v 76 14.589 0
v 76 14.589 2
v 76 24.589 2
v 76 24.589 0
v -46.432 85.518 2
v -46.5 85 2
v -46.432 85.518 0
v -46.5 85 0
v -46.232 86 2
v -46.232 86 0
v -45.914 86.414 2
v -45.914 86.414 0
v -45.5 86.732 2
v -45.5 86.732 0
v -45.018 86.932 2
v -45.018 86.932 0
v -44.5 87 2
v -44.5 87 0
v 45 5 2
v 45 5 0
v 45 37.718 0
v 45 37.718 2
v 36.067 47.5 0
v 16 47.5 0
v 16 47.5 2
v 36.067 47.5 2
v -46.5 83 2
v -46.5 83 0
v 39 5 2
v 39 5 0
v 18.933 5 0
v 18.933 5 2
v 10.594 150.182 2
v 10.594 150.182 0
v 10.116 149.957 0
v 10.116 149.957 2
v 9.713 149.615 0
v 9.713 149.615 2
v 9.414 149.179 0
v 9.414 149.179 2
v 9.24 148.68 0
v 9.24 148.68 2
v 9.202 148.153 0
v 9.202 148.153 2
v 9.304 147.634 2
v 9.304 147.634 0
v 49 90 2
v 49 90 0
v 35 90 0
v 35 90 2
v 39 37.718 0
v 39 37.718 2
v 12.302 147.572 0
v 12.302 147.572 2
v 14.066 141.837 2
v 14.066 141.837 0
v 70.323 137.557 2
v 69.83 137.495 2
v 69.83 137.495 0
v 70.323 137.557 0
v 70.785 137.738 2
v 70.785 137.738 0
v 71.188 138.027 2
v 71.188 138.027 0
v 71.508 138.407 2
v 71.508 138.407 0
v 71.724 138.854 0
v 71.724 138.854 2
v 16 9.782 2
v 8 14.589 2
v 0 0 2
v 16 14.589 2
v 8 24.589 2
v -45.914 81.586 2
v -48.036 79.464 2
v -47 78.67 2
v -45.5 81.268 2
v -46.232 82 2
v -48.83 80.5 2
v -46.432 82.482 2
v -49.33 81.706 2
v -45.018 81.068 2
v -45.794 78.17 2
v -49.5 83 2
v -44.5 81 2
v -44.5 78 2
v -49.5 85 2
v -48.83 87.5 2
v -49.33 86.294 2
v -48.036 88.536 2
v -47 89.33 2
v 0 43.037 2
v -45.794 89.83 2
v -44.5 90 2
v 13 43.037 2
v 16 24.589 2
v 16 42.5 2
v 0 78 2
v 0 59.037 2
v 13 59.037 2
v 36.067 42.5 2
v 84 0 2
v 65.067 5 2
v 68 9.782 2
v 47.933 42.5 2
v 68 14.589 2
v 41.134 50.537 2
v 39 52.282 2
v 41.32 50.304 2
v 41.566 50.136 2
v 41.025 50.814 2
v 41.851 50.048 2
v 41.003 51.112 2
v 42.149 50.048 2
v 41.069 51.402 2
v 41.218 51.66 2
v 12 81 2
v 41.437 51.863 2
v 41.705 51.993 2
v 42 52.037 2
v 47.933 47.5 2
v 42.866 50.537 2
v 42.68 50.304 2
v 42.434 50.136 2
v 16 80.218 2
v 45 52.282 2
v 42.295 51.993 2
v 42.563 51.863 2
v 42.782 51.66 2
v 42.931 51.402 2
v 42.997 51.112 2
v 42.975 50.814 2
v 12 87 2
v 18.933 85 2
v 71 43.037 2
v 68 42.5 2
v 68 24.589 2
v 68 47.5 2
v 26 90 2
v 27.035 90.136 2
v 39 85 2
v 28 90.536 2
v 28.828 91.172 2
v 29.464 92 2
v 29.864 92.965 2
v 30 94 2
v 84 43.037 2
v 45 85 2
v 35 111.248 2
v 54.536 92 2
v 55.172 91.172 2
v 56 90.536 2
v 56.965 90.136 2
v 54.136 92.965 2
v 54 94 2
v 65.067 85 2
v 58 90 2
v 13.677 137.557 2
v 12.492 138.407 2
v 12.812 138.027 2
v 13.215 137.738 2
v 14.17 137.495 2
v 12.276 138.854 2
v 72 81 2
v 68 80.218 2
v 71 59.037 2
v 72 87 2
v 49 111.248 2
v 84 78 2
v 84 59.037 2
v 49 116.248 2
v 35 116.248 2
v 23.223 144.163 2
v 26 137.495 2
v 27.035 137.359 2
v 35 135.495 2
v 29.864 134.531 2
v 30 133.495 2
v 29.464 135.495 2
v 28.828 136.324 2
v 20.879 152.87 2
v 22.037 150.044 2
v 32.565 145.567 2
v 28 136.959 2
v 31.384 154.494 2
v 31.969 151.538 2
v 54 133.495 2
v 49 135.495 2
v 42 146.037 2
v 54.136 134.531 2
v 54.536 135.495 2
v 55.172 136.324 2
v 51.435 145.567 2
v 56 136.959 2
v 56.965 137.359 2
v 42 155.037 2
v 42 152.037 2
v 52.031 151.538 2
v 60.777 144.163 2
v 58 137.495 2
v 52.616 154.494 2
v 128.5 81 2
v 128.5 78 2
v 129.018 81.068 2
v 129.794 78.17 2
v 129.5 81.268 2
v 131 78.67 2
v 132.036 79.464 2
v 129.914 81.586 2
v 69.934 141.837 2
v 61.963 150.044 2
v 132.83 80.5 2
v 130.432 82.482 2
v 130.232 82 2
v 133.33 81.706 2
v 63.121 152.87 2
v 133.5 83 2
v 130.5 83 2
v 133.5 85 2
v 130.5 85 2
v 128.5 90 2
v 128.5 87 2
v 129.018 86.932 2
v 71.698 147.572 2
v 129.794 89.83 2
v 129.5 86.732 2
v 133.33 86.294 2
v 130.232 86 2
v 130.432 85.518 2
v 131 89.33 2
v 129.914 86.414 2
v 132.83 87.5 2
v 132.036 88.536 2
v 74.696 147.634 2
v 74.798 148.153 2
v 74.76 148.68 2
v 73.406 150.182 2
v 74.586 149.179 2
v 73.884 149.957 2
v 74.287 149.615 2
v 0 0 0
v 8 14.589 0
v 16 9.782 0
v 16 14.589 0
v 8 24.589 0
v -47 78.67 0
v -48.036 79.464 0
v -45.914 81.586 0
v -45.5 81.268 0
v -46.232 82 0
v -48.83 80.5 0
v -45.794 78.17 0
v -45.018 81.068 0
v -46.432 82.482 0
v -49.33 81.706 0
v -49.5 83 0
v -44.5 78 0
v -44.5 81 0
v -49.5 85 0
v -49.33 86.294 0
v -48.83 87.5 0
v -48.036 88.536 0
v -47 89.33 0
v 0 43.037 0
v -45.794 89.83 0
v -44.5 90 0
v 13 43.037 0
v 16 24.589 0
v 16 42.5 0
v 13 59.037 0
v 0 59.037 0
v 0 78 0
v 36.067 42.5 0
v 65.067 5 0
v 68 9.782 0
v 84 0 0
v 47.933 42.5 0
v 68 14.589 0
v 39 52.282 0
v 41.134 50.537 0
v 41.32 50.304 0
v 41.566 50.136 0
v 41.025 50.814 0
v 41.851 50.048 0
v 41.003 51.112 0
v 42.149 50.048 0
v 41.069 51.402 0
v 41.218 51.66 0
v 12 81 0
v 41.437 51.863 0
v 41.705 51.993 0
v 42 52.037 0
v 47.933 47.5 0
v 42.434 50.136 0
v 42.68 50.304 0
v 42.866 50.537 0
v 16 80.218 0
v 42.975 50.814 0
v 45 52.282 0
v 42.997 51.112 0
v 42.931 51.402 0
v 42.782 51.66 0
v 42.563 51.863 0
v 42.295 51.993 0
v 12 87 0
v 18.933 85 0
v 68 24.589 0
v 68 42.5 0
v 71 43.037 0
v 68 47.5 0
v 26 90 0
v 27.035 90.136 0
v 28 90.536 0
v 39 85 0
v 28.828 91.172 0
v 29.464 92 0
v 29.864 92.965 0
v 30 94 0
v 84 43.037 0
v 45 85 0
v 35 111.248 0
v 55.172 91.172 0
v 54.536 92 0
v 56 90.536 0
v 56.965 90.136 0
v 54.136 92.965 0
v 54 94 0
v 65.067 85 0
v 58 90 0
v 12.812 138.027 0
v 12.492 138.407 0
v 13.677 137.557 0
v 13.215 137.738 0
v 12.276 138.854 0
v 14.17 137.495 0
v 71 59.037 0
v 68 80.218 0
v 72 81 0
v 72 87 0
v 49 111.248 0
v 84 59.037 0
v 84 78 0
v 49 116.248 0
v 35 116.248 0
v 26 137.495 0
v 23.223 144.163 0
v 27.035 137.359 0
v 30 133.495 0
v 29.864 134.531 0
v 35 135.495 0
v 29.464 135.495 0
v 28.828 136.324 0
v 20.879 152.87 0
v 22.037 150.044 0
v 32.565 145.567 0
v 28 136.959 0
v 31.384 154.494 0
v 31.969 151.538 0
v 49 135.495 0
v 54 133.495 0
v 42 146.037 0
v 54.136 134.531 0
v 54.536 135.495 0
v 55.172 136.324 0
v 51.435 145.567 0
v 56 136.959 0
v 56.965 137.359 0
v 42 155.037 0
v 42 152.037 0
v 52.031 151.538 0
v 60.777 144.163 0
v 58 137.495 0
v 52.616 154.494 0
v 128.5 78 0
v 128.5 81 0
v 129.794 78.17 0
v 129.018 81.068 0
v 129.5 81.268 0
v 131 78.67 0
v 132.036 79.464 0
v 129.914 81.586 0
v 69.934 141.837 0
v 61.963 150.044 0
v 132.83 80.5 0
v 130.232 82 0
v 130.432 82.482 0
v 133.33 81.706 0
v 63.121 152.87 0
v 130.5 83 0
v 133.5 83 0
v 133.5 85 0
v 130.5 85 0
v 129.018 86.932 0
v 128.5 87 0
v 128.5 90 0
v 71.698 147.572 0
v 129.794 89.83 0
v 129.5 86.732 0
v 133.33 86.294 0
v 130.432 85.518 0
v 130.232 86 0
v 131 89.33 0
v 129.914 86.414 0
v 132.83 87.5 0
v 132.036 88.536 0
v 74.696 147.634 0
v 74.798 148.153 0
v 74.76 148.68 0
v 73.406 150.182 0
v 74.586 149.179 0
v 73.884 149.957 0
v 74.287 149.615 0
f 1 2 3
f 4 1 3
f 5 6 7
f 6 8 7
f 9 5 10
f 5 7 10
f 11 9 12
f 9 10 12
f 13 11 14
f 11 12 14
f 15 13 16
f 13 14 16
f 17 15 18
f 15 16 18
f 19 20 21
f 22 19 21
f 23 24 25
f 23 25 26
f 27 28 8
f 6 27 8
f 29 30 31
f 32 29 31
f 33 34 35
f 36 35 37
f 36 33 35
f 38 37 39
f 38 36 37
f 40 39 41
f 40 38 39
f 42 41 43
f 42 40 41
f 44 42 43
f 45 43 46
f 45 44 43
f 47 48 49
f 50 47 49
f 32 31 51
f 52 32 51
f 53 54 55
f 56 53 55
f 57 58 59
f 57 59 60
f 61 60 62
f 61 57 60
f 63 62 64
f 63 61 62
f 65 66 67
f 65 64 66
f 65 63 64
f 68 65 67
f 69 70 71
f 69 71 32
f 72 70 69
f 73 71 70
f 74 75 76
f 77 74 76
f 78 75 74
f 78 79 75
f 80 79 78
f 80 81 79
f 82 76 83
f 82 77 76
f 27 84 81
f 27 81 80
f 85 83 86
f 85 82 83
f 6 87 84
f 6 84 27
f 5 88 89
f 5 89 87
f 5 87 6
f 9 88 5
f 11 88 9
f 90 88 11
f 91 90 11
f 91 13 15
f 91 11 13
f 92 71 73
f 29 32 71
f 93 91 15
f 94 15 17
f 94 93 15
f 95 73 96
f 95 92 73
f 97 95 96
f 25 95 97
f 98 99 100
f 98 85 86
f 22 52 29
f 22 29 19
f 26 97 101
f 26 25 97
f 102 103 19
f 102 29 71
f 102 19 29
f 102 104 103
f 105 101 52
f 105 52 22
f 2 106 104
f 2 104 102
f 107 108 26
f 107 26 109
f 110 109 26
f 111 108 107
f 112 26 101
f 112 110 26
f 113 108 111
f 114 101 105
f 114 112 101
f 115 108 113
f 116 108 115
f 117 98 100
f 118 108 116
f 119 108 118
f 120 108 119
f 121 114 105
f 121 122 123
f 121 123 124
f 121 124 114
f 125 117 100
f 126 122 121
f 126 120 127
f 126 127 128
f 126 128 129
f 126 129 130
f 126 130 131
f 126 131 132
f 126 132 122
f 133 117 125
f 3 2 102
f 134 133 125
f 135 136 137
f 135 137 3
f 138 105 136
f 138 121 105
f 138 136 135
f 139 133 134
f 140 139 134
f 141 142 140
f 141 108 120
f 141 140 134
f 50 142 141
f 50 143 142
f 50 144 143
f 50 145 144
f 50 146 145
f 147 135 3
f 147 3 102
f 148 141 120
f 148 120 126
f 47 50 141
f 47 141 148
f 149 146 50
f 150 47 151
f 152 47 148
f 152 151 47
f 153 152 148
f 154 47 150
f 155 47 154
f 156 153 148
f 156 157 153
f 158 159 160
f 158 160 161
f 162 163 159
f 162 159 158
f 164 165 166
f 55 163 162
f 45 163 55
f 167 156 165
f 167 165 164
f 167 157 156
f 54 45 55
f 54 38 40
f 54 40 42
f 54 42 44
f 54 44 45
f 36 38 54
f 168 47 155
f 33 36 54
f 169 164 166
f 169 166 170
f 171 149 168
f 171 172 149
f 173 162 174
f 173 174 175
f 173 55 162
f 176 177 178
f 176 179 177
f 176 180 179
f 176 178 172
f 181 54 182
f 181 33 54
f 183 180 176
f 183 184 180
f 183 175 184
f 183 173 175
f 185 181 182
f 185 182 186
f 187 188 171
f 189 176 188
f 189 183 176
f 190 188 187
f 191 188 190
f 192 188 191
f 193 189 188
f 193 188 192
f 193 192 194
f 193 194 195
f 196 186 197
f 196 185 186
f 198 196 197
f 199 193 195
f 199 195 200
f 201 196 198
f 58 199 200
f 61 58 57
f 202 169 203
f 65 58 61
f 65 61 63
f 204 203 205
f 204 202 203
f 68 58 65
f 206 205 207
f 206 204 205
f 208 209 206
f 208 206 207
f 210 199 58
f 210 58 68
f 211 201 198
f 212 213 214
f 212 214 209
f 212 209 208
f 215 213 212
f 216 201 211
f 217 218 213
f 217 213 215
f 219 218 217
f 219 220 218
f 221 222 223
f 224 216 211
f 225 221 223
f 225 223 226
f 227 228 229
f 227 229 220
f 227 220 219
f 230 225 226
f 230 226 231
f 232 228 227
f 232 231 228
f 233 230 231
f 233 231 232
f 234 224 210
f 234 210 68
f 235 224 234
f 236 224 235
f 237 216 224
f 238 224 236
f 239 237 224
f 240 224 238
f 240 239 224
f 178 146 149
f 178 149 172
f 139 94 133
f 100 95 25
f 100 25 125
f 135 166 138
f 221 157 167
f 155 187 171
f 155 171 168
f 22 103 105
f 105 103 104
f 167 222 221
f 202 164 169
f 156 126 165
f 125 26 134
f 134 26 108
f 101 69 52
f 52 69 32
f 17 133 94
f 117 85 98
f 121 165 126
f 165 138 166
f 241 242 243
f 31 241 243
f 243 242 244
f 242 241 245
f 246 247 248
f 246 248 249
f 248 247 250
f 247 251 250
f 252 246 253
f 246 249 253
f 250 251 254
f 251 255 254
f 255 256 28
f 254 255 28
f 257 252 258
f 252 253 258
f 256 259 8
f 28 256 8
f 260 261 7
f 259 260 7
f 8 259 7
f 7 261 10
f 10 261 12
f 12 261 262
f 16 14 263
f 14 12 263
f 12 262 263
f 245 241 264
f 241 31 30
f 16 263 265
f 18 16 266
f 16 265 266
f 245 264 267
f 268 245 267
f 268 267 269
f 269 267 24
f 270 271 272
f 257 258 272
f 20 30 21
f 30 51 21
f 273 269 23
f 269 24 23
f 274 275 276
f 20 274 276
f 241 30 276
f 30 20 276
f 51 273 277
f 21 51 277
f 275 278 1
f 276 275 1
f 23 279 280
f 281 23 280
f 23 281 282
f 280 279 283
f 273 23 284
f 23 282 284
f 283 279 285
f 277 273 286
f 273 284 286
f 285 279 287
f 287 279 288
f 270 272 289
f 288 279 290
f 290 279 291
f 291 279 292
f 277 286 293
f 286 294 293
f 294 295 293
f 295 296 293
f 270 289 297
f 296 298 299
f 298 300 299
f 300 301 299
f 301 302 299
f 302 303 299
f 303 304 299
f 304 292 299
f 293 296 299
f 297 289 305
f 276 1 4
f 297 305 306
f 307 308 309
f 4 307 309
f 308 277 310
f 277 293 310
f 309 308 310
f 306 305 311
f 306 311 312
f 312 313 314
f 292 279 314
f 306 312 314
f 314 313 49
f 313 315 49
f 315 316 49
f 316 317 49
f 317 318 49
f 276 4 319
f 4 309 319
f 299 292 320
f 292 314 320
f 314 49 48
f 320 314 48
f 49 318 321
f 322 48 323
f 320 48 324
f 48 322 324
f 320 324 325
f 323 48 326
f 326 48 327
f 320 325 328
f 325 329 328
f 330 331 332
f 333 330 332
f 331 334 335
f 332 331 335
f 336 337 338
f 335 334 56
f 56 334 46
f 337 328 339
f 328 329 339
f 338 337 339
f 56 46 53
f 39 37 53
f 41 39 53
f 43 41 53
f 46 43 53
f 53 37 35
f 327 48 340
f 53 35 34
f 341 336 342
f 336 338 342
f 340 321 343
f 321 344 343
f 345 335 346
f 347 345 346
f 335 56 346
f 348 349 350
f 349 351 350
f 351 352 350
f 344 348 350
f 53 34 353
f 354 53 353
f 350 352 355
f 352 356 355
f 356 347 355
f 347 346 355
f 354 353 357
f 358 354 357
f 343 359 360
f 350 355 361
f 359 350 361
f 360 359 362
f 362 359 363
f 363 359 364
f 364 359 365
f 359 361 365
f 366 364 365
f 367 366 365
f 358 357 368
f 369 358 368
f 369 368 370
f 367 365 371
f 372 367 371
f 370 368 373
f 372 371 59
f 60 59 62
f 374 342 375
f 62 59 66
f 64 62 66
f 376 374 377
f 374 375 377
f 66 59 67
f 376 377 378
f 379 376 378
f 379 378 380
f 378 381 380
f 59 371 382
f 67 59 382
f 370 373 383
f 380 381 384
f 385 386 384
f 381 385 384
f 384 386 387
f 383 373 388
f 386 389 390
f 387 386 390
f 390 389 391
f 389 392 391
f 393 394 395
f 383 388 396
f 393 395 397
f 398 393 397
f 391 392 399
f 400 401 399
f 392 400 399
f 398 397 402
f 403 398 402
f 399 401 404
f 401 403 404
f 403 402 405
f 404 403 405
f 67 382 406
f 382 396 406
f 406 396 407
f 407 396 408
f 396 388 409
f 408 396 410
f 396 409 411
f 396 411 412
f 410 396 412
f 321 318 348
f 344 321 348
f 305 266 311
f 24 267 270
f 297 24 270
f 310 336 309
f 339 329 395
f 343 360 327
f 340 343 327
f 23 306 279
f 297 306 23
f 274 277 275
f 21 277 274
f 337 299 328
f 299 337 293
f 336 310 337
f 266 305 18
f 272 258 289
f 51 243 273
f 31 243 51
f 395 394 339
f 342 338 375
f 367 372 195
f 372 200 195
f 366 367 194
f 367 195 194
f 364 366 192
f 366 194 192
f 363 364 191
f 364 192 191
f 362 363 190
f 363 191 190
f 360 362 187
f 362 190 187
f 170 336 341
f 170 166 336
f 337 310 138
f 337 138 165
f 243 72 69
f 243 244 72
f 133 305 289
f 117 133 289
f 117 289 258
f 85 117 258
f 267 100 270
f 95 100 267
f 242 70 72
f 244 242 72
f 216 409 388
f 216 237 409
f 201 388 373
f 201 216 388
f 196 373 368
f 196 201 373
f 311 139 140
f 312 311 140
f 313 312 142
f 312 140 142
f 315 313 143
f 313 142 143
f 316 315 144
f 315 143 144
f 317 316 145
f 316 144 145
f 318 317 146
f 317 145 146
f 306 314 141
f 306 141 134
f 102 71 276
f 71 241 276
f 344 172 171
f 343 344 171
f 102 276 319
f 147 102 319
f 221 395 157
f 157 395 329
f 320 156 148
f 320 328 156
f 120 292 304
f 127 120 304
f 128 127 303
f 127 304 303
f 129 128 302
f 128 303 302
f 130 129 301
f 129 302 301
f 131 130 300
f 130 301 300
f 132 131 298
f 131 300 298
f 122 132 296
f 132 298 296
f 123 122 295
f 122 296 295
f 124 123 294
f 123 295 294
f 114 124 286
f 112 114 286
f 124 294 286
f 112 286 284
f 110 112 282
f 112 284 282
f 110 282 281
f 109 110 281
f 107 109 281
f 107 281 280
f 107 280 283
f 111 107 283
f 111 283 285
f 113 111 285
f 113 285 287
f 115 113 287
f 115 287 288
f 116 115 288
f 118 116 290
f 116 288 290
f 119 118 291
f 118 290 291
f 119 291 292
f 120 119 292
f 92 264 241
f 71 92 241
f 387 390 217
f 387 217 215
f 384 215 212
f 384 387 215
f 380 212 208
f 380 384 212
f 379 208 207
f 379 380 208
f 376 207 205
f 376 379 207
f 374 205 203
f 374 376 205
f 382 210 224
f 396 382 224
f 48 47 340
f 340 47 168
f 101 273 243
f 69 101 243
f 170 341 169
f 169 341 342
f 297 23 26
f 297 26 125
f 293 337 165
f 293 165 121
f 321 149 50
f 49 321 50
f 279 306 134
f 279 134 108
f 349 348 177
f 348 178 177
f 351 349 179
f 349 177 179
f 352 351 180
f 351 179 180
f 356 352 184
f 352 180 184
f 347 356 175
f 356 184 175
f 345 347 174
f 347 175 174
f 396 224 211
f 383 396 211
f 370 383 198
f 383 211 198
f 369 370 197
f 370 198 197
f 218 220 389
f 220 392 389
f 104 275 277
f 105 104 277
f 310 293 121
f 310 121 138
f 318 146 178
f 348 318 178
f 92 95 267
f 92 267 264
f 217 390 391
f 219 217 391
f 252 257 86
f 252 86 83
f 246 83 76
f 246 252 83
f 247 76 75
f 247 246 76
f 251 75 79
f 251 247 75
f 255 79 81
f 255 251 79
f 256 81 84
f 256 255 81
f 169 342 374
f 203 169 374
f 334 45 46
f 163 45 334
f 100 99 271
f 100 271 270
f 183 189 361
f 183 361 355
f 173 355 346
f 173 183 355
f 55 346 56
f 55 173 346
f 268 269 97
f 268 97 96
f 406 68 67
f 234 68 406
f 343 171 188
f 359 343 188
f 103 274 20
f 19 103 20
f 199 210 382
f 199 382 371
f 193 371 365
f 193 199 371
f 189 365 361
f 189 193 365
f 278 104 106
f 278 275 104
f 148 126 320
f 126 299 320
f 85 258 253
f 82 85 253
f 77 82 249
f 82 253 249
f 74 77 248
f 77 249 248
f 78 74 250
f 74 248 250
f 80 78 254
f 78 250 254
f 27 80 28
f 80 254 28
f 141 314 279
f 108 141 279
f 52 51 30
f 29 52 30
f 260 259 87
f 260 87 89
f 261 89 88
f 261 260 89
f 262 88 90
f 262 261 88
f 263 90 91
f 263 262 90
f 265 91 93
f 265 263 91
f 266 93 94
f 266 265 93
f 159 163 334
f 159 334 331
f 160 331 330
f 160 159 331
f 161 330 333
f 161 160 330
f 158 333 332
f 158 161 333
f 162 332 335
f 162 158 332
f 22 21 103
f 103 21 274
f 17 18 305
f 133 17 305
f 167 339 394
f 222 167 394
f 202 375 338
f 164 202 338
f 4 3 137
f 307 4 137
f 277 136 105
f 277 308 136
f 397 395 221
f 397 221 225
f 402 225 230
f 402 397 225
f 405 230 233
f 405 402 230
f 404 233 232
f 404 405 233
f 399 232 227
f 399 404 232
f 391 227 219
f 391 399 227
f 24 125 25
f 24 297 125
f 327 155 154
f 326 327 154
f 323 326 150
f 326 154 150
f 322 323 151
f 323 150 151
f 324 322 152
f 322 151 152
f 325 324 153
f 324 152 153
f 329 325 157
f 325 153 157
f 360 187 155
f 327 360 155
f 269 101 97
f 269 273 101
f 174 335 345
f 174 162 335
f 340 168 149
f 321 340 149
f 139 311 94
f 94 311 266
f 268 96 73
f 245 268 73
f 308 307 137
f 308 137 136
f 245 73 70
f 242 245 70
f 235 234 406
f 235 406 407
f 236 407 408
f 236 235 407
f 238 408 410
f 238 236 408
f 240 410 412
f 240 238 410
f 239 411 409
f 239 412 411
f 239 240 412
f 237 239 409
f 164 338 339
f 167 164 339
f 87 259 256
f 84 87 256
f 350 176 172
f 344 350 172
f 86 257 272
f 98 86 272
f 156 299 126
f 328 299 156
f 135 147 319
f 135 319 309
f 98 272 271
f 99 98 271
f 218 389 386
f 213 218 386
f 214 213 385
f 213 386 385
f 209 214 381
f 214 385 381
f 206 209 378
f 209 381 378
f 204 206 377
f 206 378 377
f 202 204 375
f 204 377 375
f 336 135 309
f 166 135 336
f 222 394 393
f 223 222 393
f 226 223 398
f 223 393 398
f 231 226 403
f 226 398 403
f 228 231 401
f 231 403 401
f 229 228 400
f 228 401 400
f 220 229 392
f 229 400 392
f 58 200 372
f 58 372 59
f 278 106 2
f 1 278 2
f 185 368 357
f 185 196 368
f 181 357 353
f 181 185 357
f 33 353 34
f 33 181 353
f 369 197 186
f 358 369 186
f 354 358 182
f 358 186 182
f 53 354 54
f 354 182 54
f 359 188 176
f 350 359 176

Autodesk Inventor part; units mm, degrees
ref_plane "YZ Plane" through (0, 0, 0) normal (1, 0, 0) x (0, 1, 0)
ref_plane "XZ Plane" through (0, 0, 0) normal (0, 1, 0) x (-1, 0, 0)
ref_plane "XY Plane" through (0, 0, 0) normal (0, 0, 1) x (1, 0, 0)
sketch "Sketch1" plane through (0, 0, 0) normal (0, 0, 1) x (1, 0, 0)
  line L0 (0, 0) -> (42, 0)
  line L1 (42, 0) -> (42, 90)
  line L2 (42, 90) -> (0, 90)
  line L3 (0, 90) -> (0, 0)
  line L4 (0, 90) -> (16, 90)
  line L5 (16, 90) -> (16, 0)
  line L6 (16, 0) -> (0, 0)
  line L7 (0, 0) -> (0, 90)
  line L8 (16, 90) -> (42, 90)
  line L9 (42, 90) -> (42, 85)
  line L10 (42, 85) -> (16, 85)
  line L11 (16, 85) -> (16, 90)
  line L12 (16, 0) -> (42, 0)
  line L13 (42, 0) -> (42, 5)
  line L14 (42, 5) -> (16, 5)
  line L15 (16, 5) -> (16, 0)
  line L16 (16, 47.5) -> (42, 47.5)
  line L17 (42, 47.5) -> (42, 42.5)
  line L18 (42, 42.5) -> (16, 42.5)
  line L19 (16, 42.5) -> (16, 47.5)
  line L20 (0, 90) -> (-44.5, 90)
  line L21 (-49.5, 85) -> (-49.5, 83)
  line L22 (-44.5, 78) -> (0, 78)
  line L23 (0, 78) -> (0, 90)
  arc A0 (-44.5, 90) -> (-49.5, 85) centre (-44.5, 85) ccw
  arc A1 (-49.5, 83) -> (-44.5, 78) centre (-44.5, 83) ccw
  line L24 (-44.5, 87) -> (-3, 87)
  line L25 (-3, 87) -> (-3, 81)
  line L26 (-3, 81) -> (-44.5, 81)
  arc A2 (-46.5, 83) -> (-44.5, 81) centre (-44.5, 83) ccw
  line L27 (-46.5, 83) -> (-46.5, 85)
  arc A3 (-44.5, 87) -> (-46.5, 85) centre (-44.5, 85) ccw
  line L28 (-3, 87) -> (12, 87)
  line L29 (12, 87) -> (12, 81)
  line L30 (12, 81) -> (-3, 81)
  line L31 (-3, 81) -> (-3, 87)
  line L32 (42, 85) -> (39, 85)
  line L33 (39, 85) -> (39, 5)
  line L34 (39, 5) -> (42, 5)
  line L35 (42, 5) -> (42, 85)
  circle A4 centre (42, 51.037) radius 1
  line L36 (16, 85) -> (39, 47.5) construction
  line L37 (39, 42.5) -> (16, 5) construction
  line L38 (18.9328, 85) -> (39, 52.2817)
  line L39 (36.0672, 47.5) -> (16, 80.2183)
  line L40 (36.0672, 42.5) -> (16, 9.7817)
  line L41 (18.9328, 5) -> (39, 37.7183)
  point P0 (16, 45)
  point P1 (16, 45)
  point P2 (-49.5, 78)
  point P3 (-49.5, 90)
  point P4 (27.5, 23.75)
  point P5 (16, 42.5)
  point P6 (0, 78)
  point P7 (42, 50.037)
  point P8 (42, 52.037)
  dimension "d0" = 42
  dimension "d1" = 90
  dimension "d2" = 16
  dimension "d3" = 5
  dimension "d4" = 26
  dimension "d5" = 5
  dimension "d6" = 26
  dimension "d7" = 5
  dimension "d8" = 49.5
  dimension "d9" = 12
  dimension "d10" = 5
  dimension "d11" = 3
  dimension "d12" = 15
  dimension "d13" = 6
  dimension "d14" = 3
  dimension "d17" = 2
  dimension "d19" = 38.963
  dimension "d20" = 2.5
  dimension "d21" = 2.5
  dimension "d22" = 2.5
  dimension "d23" = 2.5
extrude "Extrusion1" add sketch "Sketch1" along normal blind 2 contours L3 L30 L29 L28 L2 L5 L0 | L5 L14 L1 L0 | L22 A1 L21 A0 L20 L3 L28 L24 A3 L27 A2 L26 L30 | L5 L40 L18 L33 L41 L14 | L14 L33 L18 L1 | L18 L33 L16 L1 | L5 L16 L33 L18 | L16 L33 L10 L1 A4 | L2 L1 L10 L5 | L16 L39 L5 L10 L38 L33
sketch "Sketch2" plane through (0, 0, 2) normal (0, 0, 1) x (1, 0, 0)
  arc A0 (42, 52.037) -> (42, 50.037) centre (42, 51.037) ccw projected
  circle A1 centre (42, 51.037) radius 104 construction
  circle A2 centre (42, 51.037) radius 101 construction
  circle A3 centre (42, 51.037) radius 95 construction
  circle A4 centre (42, 51.037) radius 93 construction
  line L0 (42, 90) -> (-44.5, 90) projected
  line L1 (42, 90) -> (42, -52.963)
  line L2 (42, 155.037) -> (42, 90)
  line L3 (42, 51.037) -> (8.6562, 149.5469) construction
  line L4 (42, 51.037) -> (146, 51.037) construction
  line L5 (42, 51.037) -> (13.2923, 139.4953) construction
  line L6 (42, 51.037) -> (135, 51.037) construction
  line L7 (42, 51.037) -> (12.3019, 147.5721) construction
  line L8 (42, 51.037) -> (143, 51.037) construction
  line L9 (12.3019, 147.5721) -> (14.0662, 141.8373)
  arc A5 (42, 152.037) -> (12.3019, 147.5721) centre (42, 51.037) ccw
  arc A6 (42, 146.037) -> (14.0662, 141.8373) centre (42, 51.037) ccw
  line L10 (14.0662, 141.8373) -> (16.0662, 141.8373) construction
  line L11 (13.2923, 139.4953) -> (13.2923, 137.4953) construction
  line L12 (9.3038, 147.6339) -> (12.2756, 138.8541)
  arc A7 (42, 155.037) -> (10.5942, 150.1817) centre (42, 51.037) ccw
  line L13 (42, 90) -> (30, 90)
  line L14 (30, 94) -> (30, 133.4953)
  line L15 (30, 137.4953) -> (42, 137.4953)
  line L16 (42, 137.4953) -> (42, 90)
  line L17 (14.17, 137.4953) -> (26, 137.4953)
  line L18 (30, 137.4953) -> (35, 137.4953)
  line L19 (35, 137.4953) -> (35, 90)
  line L20 (35, 90) -> (30, 90)
  line L21 (30, 90) -> (30, 137.4953)
  line L22 (35, 137.4953) -> (42, 137.4953)
  line L23 (42, 137.4953) -> (42, 135.4953)
  line L24 (42, 135.4953) -> (35, 135.4953)
  line L25 (35, 135.4953) -> (35, 137.4953)
  line L26 (35, 116.2476) -> (42, 116.2476)
  line L27 (42, 116.2476) -> (42, 111.2476)
  line L28 (42, 111.2476) -> (35, 111.2476)
  line L29 (35, 111.2476) -> (35, 116.2476)
  arc A8 (10.5942, 150.1817) -> (9.3038, 147.6339) centre (11.1982, 148.2751) ccw
  arc A9 (12.2756, 138.8541) -> (14.17, 137.4953) centre (14.17, 139.4953) ccw
  line L30 (26, 90) -> (26, 90)
  arc A10 (26, 90) -> (30, 94) centre (26, 94) ccw
  arc A11 (30, 133.4953) -> (26, 137.4953) centre (26, 133.4953) ccw
  point P0 (0, 0)
  point P1 (12.7355, 137.4953)
  point P2 (35, 113.7476)
  point P3 (35, 113.7476)
  point P4 (42, 152.037)
  dimension "d27" = 202
  dimension "d29" = 186
  dimension "d26" = 208
  dimension "d28" = 190
  dimension "d30" = 108.7
  dimension "d31" = 107.98
  dimension "d32" = 101
  dimension "d33" = 107.1
  dimension "d36" = 2
  dimension "d37" = 12
  dimension "d38" = 5
  dimension "d39" = 2
  dimension "d40" = 7
  dimension "d41" = 5
  dimension "d42" = 2
  dimension "d43" = 2
  dimension "d44" = 4
  dimension "d45" = 4
extrude "Extrusion2" add sketch "Sketch2" against normal blind 2 contours L0 L21 L14 L15 L19 | L28 L19 L26 L2 | L0 A10 L21 | L24 L19 L15 L2 | A11 L17 A9 L12 A8 A7 L2 A5 L9 A6 L15 L21
sketch "Sketch3" plane through (0, 0, 2) normal (0, 0, 1) x (1, 0, 0)
  line L0 (0, 59.037) -> (13, 59.037)
  line L1 (13, 59.037) -> (13, 43.037)
  line L2 (13, 43.037) -> (0, 43.037)
  line L3 (0, 43.037) -> (0, 59.037)
  line L4 (12, 81) -> (-44.5, 81) projected
  line L5 (0, 78) -> (0, 0) projected
  line L6 (16, 9.7817) -> (16, 42.5) projected
  line L7 (16, 24.589) -> (8, 24.589)
  line L8 (8, 24.589) -> (8, 14.589)
  line L9 (8, 14.589) -> (16, 14.589)
  line L10 (16, 14.589) -> (16, 24.589)
  line L11 (0, 0) -> (42, 0) projected
  line L12 (26, 90) -> (-44.5, 90) projected
  point P0 (0, 51.037)
  point P1 (16, 19.589)
  dimension "d48" = 13
  dimension "d49" = 16
  dimension "d51" = 0
  dimension "d52" = 8
  dimension "d53" = 10
  dimension "d54" = 19.589
  dimension "d55" = 38.963
extrude "Extrusion3" cut sketch "Sketch3" against normal through all
mirror "Mirror2" about plane through (42, 52.037, 0) normal (1, 0, 0)
properties part number "StructureV2Laser"
